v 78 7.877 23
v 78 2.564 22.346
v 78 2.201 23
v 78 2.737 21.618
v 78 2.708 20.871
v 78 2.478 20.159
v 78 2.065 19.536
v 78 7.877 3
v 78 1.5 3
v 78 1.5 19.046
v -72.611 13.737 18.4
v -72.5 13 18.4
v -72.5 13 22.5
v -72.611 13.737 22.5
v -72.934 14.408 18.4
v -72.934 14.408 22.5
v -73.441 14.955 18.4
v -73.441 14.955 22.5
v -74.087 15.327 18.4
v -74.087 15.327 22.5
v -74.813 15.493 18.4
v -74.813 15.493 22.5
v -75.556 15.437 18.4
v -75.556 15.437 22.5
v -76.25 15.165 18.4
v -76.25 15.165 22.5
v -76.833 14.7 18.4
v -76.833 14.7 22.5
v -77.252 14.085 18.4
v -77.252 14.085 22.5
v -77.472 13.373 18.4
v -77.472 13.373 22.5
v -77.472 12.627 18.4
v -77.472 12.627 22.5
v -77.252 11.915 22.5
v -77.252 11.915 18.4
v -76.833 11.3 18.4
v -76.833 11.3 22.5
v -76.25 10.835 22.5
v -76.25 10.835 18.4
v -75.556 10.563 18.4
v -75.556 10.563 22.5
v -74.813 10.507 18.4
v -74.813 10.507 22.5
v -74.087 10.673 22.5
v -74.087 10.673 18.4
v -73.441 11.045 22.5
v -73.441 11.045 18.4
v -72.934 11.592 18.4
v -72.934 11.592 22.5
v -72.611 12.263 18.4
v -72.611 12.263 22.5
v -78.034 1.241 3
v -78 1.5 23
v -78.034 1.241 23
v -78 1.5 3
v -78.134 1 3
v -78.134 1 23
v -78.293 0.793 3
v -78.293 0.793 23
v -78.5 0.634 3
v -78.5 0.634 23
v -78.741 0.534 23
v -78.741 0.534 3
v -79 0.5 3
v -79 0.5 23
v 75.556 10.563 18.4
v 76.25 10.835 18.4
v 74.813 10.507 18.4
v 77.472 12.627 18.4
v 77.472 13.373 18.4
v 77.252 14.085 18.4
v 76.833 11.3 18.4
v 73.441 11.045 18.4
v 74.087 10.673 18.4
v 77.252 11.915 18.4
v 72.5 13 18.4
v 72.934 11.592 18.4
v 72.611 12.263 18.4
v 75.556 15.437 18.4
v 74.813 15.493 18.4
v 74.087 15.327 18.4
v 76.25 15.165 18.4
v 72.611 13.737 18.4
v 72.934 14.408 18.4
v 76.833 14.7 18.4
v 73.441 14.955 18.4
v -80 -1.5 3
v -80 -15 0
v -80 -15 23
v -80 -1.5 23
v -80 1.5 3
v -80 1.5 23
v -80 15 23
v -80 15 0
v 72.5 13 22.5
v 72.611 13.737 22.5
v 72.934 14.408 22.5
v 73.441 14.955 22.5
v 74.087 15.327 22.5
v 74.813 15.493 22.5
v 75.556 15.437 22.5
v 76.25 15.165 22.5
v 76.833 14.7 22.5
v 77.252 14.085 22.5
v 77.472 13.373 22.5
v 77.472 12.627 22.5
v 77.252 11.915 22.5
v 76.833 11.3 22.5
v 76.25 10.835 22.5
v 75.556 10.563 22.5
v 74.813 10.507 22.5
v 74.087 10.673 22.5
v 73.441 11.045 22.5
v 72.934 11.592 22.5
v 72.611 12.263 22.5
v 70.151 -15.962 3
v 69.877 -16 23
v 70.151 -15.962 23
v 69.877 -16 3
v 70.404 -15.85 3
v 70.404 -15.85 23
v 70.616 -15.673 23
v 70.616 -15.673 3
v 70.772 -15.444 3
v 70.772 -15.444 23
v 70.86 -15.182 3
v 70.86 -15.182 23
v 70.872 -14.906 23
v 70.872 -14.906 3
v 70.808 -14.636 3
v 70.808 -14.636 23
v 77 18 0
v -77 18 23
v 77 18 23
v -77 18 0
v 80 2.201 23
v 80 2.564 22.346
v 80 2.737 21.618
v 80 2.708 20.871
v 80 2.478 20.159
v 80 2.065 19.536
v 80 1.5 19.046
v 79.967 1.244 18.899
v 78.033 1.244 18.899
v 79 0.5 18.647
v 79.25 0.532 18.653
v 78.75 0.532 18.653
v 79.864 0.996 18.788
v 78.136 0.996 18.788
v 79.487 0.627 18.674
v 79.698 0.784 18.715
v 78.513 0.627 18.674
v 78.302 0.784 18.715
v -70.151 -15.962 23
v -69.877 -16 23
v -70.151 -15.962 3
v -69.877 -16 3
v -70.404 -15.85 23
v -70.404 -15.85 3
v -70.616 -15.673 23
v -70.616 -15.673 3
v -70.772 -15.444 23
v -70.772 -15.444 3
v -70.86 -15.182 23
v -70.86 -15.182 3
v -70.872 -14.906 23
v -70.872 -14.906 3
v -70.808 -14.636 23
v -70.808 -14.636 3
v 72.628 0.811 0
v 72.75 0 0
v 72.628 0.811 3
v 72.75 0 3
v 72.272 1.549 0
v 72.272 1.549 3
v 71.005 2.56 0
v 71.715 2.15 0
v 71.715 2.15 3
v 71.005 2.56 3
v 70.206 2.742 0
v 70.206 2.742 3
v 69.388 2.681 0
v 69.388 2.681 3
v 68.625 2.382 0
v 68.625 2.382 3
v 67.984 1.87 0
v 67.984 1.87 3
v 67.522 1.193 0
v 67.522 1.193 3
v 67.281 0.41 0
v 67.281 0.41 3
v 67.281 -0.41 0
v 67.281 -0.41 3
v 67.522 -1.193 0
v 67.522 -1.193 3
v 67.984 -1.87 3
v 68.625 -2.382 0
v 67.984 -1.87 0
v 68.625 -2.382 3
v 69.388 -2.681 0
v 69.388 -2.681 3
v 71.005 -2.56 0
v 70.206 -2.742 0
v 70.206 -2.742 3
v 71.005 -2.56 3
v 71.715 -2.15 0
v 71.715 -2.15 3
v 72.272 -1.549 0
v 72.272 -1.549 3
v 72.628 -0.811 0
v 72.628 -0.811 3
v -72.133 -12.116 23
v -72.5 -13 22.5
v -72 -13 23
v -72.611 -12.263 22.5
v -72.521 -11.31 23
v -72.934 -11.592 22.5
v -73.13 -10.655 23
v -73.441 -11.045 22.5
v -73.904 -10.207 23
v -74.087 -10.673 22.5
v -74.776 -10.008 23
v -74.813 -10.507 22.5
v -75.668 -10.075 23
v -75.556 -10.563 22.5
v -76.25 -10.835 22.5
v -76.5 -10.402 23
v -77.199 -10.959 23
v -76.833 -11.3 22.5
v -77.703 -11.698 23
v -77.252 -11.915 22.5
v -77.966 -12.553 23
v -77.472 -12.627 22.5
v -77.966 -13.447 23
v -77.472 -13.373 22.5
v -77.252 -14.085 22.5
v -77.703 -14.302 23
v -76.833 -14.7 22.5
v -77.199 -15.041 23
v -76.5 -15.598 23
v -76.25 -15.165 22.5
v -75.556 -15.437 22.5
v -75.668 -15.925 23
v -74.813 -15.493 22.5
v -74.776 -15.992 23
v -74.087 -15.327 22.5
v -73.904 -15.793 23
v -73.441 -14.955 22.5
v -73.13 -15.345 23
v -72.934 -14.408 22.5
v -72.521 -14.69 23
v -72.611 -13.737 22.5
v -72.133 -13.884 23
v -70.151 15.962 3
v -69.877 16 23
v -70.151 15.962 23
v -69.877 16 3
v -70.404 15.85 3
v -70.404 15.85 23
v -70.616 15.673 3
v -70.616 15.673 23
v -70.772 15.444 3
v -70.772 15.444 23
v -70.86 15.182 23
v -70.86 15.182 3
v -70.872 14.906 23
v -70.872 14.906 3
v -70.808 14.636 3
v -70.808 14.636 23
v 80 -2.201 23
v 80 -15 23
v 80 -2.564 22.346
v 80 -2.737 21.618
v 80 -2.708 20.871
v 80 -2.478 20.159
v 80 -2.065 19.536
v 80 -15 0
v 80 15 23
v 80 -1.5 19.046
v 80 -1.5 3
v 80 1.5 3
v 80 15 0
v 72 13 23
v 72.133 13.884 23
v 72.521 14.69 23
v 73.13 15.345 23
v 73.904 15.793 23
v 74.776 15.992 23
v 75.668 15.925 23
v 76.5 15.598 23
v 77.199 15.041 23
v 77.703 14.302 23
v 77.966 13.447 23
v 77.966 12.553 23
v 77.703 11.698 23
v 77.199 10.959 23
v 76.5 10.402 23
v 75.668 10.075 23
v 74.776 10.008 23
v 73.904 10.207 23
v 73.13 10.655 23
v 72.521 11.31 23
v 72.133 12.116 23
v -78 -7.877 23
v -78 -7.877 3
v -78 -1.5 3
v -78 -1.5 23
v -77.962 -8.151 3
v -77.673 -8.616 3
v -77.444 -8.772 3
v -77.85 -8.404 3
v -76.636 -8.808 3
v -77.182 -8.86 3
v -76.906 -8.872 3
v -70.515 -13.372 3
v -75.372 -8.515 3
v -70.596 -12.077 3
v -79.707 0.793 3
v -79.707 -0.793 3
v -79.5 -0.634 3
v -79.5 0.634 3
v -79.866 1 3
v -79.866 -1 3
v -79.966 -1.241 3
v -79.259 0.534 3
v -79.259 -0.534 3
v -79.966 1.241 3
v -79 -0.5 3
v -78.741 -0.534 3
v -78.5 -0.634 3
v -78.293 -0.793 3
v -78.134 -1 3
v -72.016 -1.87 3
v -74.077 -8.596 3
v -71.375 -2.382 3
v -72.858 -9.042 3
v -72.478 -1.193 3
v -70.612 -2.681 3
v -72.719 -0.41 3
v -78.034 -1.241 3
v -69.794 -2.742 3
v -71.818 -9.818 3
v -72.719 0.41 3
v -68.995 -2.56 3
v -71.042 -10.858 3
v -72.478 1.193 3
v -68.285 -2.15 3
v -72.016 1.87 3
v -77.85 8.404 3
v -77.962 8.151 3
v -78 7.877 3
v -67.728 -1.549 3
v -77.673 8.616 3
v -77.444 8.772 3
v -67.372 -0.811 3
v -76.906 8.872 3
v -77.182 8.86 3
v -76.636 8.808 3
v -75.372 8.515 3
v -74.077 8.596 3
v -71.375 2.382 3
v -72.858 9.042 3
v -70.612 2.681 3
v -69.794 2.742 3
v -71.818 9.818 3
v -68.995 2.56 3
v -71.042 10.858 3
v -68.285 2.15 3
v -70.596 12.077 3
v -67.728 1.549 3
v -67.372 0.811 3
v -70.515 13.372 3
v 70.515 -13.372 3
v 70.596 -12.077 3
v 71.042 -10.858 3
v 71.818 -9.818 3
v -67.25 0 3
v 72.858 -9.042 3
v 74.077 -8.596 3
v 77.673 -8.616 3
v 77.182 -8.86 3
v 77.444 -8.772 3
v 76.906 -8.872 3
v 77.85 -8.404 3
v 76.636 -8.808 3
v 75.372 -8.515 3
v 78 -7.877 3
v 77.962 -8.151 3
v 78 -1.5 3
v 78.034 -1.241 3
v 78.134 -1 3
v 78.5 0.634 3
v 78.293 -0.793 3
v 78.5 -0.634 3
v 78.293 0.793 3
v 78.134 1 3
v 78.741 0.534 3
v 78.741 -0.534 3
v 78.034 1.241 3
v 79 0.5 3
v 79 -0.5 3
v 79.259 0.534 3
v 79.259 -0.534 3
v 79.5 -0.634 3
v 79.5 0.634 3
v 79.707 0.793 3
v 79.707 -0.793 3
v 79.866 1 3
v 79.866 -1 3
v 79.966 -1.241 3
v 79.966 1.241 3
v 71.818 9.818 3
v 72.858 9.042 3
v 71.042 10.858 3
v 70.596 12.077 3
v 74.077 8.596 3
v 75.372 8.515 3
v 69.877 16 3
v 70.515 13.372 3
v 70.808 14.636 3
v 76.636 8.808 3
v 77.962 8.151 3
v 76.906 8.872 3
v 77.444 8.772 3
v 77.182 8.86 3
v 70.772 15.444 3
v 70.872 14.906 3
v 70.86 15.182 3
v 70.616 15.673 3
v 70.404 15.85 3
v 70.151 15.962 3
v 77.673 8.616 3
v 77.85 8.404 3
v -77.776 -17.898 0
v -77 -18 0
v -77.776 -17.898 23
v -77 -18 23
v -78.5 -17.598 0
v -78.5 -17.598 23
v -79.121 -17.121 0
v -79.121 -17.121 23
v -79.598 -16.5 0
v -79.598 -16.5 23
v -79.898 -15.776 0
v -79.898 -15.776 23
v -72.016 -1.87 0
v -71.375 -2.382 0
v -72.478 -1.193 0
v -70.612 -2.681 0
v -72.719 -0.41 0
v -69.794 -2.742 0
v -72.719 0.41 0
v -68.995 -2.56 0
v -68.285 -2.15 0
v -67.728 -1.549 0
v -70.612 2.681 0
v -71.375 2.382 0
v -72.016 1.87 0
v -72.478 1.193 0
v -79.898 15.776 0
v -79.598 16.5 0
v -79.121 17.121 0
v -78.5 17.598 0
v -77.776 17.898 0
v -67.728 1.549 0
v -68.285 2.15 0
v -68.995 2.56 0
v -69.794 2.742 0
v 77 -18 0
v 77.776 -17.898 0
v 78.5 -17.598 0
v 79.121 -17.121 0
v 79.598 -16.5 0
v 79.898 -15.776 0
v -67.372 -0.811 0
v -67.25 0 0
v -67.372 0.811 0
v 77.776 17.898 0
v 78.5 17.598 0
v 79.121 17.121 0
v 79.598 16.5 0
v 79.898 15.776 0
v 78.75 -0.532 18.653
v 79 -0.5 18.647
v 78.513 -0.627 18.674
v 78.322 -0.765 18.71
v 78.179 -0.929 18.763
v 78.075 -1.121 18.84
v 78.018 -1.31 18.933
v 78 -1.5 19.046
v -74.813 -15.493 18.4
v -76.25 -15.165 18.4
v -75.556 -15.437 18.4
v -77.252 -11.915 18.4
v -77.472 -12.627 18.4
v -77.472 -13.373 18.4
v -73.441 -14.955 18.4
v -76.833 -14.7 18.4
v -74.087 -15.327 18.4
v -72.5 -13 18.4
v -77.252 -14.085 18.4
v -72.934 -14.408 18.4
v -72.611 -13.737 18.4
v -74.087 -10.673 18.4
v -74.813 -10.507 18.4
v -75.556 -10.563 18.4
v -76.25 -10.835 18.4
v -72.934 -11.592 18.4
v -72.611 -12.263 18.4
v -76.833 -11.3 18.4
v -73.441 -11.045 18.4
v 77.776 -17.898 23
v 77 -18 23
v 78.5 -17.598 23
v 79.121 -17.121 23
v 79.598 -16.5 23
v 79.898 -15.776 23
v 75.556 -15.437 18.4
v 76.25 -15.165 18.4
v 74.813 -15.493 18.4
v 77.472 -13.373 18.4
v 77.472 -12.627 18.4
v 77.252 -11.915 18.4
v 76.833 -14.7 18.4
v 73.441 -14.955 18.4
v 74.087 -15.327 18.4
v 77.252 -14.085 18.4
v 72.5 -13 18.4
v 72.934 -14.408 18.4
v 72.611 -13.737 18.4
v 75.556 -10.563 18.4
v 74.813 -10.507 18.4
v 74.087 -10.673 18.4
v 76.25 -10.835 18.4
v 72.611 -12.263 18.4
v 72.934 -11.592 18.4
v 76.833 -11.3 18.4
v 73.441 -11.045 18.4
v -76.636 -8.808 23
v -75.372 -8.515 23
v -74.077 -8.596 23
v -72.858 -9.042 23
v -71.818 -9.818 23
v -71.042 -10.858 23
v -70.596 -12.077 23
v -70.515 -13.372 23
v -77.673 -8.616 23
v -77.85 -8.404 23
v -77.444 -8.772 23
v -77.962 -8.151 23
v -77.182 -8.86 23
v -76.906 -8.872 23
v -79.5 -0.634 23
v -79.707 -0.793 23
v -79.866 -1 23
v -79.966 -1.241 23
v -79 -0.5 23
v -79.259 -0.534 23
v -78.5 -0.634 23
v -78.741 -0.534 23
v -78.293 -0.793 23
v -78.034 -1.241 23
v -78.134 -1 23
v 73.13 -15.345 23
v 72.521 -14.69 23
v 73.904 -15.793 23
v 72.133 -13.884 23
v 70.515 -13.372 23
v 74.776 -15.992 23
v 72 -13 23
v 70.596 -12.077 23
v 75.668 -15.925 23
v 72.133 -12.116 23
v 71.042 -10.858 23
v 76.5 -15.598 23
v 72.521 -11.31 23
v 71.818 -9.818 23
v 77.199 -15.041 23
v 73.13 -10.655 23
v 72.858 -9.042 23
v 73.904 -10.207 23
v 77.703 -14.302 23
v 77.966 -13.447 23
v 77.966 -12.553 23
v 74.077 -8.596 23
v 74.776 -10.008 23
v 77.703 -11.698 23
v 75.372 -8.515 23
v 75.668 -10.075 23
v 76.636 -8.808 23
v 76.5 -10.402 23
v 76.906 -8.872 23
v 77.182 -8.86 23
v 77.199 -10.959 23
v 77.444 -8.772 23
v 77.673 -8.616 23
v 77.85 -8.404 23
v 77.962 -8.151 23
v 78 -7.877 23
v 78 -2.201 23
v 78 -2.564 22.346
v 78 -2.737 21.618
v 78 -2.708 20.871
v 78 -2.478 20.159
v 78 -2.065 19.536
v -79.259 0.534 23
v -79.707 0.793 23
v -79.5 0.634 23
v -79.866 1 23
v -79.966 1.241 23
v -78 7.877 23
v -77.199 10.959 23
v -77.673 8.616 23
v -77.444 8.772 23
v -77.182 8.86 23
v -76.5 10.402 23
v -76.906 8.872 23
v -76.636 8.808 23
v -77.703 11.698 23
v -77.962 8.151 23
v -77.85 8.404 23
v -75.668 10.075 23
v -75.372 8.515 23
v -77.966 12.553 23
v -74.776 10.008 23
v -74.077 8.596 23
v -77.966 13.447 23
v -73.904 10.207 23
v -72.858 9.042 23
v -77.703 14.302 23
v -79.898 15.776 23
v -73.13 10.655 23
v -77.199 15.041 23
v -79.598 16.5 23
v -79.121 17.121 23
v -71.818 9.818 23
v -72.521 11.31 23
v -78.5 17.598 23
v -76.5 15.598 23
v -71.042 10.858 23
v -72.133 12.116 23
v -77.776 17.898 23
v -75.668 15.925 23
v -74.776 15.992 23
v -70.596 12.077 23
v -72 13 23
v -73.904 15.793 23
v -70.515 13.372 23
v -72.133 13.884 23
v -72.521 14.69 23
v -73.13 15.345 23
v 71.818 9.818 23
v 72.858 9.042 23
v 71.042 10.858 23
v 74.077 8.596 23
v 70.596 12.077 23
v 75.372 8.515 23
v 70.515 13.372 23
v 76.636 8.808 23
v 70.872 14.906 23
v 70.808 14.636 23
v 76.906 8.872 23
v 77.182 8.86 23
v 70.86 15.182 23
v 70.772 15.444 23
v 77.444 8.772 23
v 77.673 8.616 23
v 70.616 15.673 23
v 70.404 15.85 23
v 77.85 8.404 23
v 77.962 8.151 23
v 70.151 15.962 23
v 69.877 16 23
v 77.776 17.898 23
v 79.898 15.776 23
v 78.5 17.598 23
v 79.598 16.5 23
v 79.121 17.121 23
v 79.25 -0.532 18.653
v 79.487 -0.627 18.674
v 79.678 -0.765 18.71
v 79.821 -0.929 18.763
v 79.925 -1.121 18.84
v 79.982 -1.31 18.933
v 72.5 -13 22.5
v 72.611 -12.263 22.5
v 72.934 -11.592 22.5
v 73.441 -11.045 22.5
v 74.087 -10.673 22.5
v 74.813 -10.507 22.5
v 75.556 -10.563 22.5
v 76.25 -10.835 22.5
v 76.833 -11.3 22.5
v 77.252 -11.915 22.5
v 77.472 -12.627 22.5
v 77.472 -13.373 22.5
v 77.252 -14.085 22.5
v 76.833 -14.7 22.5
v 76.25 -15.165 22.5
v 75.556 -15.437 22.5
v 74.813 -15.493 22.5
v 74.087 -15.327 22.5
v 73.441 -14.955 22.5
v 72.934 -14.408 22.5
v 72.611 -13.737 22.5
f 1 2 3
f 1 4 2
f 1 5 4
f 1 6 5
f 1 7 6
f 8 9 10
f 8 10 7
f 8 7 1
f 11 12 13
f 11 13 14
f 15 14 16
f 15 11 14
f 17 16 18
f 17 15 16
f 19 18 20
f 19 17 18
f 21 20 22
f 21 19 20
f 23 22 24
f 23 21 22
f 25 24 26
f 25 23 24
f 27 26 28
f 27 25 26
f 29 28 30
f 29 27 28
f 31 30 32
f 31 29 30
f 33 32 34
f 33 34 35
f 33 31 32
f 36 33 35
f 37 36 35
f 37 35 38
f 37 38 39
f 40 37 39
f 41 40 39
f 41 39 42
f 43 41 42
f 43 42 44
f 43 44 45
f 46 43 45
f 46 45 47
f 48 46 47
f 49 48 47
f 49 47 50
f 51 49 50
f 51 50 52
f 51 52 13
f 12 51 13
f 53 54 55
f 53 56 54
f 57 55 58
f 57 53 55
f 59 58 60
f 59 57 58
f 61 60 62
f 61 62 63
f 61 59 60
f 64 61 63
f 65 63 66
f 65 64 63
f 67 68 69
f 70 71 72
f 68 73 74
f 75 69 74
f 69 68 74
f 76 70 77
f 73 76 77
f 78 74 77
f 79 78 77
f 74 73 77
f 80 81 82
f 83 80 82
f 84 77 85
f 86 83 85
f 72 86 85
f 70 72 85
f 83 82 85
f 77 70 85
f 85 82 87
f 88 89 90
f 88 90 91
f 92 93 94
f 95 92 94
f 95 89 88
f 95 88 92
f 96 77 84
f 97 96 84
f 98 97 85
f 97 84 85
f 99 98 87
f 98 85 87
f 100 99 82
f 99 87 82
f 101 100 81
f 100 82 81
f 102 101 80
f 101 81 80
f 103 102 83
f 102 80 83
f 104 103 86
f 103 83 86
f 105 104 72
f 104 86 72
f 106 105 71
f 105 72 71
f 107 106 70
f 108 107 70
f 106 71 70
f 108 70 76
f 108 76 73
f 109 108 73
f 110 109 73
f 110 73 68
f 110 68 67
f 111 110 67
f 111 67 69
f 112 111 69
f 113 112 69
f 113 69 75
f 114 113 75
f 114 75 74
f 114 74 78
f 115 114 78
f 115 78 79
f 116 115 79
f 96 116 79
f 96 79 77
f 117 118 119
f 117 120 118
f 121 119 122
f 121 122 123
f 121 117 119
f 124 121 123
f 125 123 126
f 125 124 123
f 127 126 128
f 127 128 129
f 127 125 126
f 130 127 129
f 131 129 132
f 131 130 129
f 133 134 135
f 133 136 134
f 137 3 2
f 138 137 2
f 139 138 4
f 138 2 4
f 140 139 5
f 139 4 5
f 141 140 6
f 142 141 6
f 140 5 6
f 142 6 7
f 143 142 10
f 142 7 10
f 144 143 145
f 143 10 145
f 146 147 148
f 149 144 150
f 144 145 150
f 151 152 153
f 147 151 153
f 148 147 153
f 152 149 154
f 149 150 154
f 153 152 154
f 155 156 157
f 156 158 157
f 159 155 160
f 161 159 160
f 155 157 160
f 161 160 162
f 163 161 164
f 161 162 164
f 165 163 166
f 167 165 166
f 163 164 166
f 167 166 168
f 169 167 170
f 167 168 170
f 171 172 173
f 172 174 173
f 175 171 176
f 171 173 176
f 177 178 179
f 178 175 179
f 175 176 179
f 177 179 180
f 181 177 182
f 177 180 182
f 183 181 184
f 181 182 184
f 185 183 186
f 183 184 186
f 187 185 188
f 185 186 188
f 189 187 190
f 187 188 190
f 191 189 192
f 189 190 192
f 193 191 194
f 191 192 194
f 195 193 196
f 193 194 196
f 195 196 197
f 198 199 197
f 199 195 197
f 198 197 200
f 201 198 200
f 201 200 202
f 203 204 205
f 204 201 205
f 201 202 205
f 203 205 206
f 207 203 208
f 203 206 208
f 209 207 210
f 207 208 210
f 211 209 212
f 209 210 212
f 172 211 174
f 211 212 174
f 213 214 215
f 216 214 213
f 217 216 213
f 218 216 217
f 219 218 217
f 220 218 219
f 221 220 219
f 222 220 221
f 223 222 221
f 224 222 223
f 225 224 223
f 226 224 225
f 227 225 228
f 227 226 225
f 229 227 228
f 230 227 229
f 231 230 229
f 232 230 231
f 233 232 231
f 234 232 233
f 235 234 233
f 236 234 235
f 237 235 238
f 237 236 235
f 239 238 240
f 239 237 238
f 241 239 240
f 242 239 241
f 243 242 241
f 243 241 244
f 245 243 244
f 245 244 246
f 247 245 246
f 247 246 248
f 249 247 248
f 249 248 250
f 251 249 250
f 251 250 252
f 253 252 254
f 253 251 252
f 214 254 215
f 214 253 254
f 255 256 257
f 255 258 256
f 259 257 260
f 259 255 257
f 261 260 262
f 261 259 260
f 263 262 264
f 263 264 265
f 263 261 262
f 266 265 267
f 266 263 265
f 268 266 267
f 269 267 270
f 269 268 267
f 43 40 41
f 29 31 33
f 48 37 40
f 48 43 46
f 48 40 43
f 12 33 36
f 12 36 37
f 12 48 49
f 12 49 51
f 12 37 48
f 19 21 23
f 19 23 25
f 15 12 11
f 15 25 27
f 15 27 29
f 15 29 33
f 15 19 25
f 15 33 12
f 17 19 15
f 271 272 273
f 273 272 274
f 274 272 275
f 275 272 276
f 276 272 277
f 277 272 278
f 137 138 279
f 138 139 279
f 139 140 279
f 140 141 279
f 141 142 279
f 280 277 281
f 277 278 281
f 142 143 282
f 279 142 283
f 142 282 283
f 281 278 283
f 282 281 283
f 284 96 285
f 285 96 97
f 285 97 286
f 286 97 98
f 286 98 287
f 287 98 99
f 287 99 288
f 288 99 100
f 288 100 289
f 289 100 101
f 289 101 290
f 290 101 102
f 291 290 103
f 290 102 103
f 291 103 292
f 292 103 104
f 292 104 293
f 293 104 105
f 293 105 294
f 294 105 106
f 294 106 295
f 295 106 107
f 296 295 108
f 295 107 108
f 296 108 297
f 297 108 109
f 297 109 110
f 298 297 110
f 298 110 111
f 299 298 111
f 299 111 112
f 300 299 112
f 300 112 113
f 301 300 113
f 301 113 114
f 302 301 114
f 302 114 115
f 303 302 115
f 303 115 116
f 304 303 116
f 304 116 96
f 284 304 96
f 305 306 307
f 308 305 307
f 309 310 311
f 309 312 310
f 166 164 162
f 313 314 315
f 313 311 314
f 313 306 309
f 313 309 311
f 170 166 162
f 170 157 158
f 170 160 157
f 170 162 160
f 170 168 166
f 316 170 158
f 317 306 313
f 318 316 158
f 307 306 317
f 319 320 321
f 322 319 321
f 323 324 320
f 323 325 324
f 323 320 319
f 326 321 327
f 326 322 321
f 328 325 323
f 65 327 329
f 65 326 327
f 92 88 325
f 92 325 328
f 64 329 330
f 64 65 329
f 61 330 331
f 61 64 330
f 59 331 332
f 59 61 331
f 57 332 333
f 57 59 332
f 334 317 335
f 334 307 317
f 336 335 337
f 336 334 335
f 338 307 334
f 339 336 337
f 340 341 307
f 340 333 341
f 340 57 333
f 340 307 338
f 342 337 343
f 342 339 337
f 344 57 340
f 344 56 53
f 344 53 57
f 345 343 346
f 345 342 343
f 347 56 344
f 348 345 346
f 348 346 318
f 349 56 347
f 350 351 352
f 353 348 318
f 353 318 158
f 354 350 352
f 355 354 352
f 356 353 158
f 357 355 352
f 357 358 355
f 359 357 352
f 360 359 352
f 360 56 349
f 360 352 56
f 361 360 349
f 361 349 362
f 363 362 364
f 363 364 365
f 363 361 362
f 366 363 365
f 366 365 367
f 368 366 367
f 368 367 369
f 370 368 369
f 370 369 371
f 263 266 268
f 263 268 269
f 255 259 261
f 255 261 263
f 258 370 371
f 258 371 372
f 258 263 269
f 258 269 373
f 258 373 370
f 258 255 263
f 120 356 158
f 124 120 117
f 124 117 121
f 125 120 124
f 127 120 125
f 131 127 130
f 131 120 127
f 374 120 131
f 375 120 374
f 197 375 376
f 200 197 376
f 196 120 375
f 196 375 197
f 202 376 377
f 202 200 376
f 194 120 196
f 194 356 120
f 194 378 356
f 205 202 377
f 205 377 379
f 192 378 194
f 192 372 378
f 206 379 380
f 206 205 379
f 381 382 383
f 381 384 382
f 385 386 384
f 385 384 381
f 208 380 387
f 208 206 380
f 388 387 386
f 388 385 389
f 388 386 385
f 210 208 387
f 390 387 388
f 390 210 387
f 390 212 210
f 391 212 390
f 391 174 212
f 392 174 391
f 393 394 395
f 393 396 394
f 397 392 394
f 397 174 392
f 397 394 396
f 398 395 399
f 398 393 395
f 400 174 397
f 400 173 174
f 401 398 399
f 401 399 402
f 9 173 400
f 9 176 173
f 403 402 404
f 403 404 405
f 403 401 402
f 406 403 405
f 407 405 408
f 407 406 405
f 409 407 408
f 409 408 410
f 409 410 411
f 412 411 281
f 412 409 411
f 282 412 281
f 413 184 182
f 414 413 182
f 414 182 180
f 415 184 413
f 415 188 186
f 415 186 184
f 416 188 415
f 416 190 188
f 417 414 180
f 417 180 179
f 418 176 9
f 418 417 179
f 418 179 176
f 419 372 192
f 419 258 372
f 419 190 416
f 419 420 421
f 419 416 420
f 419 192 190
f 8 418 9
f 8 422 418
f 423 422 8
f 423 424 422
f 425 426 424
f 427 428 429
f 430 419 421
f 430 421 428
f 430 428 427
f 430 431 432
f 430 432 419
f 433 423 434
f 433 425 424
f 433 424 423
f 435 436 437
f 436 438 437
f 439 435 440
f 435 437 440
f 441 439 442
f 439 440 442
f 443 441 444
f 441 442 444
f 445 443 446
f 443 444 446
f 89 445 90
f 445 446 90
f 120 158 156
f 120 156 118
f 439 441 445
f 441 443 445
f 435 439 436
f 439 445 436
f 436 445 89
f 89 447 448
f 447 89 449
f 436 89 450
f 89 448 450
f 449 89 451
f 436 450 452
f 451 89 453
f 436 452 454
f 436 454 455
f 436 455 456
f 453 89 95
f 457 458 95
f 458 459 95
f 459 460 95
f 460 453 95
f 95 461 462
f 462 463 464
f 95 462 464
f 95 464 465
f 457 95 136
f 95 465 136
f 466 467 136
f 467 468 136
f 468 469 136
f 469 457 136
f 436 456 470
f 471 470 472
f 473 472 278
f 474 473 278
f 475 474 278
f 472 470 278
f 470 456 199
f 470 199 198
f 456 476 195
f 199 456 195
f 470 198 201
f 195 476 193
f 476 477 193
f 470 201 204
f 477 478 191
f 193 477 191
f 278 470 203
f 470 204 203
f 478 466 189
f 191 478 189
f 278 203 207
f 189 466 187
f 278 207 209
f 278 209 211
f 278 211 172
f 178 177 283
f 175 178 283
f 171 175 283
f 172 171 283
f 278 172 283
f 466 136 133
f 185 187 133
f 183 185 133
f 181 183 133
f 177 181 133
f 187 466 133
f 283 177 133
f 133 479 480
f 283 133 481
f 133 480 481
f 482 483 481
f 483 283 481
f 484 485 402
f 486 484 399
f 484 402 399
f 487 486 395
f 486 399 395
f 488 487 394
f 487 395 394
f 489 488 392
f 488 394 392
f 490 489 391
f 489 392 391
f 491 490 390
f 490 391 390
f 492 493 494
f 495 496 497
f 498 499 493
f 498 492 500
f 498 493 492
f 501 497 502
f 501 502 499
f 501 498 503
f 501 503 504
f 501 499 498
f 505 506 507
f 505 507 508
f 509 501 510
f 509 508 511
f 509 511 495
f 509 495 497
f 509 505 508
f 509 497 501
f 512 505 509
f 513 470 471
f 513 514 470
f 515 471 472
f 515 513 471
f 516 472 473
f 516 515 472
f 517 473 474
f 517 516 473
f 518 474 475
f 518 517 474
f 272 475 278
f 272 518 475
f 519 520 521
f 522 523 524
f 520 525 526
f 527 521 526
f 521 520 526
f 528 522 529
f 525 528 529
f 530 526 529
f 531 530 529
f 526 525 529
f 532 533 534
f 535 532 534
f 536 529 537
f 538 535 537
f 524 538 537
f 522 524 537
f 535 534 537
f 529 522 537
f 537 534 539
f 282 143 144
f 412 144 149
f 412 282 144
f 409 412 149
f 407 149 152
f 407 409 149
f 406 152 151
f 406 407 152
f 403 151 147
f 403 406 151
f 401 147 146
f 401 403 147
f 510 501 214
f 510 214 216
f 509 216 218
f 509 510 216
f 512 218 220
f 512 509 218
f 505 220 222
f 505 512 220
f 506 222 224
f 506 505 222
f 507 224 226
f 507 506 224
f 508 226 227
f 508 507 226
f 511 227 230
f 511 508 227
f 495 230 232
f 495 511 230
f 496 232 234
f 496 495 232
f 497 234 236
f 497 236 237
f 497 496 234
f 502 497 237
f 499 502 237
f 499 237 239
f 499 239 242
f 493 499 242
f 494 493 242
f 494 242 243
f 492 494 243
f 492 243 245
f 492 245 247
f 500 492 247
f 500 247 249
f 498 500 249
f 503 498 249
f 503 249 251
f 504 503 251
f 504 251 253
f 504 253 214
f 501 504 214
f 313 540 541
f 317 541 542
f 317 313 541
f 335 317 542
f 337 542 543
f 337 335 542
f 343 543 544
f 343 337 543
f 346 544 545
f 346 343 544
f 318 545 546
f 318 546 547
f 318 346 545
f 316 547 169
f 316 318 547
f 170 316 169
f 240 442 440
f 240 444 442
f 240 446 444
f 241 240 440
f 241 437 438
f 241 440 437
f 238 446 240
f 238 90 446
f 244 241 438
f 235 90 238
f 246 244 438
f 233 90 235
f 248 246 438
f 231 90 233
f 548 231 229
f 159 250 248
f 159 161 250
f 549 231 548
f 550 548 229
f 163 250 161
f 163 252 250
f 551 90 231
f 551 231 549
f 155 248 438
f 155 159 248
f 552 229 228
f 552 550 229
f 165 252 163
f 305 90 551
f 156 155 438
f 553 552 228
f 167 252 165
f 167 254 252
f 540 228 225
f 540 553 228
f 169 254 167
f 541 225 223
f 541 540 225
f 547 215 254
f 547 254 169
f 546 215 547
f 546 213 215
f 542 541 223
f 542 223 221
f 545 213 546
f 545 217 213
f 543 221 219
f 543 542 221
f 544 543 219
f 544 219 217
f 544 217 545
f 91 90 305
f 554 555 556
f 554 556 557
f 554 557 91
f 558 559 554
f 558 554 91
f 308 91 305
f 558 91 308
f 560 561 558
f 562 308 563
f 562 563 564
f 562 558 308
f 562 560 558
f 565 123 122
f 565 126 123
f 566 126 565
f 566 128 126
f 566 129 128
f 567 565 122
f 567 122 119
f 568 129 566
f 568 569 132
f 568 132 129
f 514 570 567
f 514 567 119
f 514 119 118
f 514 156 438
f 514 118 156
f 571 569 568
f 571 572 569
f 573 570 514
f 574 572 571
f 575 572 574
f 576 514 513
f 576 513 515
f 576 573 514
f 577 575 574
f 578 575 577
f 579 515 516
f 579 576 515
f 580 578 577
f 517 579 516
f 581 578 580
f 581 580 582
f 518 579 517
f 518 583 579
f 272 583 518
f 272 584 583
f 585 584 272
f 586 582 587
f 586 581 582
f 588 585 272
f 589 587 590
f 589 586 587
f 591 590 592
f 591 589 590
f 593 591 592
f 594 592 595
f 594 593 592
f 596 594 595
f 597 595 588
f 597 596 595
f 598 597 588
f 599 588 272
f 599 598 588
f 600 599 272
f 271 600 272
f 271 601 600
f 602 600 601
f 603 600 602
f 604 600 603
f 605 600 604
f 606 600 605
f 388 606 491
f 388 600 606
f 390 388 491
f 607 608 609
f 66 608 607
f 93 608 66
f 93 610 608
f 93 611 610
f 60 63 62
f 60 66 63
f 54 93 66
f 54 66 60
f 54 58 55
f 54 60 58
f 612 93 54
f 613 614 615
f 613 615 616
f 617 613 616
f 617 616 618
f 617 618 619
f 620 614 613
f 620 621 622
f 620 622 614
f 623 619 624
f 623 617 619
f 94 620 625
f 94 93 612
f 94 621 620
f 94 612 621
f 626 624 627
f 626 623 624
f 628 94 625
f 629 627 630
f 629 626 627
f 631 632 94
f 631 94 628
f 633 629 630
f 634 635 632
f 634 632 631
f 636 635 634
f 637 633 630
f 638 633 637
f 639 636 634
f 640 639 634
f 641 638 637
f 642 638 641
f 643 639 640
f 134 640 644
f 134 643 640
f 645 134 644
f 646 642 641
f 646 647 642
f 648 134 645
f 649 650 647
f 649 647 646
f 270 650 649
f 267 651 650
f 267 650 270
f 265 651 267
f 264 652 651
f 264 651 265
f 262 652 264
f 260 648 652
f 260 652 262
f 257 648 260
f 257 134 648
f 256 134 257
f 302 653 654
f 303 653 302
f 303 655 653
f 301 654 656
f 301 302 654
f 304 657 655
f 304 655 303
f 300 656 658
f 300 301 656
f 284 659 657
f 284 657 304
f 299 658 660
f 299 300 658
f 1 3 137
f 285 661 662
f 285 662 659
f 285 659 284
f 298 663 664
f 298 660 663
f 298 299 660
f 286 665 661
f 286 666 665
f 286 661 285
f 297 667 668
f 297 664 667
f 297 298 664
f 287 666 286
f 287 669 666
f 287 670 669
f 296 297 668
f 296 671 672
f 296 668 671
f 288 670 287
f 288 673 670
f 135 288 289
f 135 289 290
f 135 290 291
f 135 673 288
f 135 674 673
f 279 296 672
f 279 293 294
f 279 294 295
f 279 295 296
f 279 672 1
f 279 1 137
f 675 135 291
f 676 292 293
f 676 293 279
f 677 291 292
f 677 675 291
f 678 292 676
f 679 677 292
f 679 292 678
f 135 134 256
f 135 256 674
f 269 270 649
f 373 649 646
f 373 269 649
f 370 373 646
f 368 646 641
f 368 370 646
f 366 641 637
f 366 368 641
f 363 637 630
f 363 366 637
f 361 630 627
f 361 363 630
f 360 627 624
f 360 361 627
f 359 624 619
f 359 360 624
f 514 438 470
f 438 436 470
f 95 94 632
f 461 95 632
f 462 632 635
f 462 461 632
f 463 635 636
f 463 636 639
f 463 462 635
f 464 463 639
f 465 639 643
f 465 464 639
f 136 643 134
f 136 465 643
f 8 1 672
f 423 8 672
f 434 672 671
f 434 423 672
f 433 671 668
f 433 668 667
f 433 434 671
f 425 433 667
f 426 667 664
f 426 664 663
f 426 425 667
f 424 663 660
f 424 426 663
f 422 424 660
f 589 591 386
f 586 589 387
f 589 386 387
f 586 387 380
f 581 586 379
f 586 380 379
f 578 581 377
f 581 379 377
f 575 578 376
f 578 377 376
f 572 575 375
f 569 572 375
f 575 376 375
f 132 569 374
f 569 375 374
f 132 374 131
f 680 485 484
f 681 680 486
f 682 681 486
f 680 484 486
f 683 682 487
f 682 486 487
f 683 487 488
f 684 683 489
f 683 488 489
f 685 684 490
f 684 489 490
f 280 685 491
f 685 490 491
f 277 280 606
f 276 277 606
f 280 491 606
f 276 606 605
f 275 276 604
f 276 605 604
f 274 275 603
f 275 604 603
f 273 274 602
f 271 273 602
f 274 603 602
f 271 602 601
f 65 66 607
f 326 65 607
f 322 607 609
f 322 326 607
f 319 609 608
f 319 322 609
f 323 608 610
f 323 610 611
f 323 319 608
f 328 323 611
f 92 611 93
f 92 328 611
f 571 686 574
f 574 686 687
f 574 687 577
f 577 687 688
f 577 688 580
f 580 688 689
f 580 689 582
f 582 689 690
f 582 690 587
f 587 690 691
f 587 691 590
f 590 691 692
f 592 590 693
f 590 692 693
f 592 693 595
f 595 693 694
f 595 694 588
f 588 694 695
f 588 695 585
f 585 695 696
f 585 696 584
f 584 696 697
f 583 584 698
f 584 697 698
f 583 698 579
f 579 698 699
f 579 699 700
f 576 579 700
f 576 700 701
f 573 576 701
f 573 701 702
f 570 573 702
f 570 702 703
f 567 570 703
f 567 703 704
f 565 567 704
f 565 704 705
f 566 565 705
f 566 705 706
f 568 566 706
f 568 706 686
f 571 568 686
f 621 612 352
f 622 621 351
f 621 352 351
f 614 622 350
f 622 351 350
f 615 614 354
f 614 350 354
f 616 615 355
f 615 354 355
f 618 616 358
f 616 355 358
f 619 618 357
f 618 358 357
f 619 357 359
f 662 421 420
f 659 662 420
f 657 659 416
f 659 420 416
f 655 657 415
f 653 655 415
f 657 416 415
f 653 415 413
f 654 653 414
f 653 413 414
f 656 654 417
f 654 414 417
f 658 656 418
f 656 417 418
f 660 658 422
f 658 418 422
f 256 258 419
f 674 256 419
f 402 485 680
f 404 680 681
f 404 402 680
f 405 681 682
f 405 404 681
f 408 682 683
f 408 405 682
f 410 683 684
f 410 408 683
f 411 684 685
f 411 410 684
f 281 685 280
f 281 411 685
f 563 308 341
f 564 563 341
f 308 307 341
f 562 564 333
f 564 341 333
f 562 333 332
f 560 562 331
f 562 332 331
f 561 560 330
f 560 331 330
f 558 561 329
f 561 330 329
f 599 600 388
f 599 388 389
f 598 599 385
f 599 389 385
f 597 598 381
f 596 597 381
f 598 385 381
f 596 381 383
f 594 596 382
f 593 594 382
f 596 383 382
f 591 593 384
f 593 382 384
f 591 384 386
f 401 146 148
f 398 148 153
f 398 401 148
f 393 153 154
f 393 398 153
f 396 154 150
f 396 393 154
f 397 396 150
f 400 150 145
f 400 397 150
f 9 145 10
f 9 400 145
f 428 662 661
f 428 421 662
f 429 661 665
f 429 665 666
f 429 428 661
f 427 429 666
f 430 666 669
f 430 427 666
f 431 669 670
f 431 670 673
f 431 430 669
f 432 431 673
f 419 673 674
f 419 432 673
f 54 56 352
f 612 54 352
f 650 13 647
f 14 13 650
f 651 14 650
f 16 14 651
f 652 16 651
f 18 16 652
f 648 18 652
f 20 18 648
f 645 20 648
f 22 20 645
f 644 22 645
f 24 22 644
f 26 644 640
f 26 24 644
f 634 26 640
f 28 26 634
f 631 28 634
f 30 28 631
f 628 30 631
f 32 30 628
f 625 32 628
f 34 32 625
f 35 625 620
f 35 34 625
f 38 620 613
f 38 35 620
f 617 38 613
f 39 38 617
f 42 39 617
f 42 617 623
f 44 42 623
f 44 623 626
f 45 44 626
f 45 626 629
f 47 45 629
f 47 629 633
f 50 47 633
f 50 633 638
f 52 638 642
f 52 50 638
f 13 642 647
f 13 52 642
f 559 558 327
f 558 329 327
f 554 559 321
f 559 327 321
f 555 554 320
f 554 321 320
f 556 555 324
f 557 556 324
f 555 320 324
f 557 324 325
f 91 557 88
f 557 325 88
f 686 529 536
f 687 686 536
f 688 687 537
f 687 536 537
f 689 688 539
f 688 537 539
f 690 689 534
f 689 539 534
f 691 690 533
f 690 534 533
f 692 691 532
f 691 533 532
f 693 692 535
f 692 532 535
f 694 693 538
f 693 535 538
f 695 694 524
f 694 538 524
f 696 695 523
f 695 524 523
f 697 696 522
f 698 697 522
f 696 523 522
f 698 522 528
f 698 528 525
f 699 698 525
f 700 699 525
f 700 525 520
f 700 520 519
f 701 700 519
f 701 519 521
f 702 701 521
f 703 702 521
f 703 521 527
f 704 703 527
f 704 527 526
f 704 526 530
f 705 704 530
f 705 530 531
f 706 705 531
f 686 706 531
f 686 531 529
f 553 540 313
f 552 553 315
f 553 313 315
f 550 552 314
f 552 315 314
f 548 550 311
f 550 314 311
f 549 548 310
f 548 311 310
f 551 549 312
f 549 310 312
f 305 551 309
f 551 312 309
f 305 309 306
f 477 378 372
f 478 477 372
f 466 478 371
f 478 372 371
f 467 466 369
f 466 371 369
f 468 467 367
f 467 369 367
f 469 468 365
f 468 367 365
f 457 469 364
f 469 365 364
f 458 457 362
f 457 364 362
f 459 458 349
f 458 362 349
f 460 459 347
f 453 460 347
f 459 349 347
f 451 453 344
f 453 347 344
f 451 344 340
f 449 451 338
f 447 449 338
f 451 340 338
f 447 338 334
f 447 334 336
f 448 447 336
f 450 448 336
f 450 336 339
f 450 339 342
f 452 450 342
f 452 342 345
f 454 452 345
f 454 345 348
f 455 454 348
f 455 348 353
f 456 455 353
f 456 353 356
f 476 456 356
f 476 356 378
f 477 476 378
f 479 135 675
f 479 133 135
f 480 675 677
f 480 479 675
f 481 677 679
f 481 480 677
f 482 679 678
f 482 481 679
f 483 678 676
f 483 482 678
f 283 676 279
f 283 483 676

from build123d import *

# Parameters (mm, degrees)
SKETCH1_W                       = 160
SKETCH1_H                       = 36
BOSS_EXTRUDE1_DEPTH             = 3
SKETCH3_W                       = 160
SKETCH3_H                       = 36
SKETCH3_W_2                     = 156
SKETCH3_H_2                     = 32
BOSS_EXTRUDE3_DEPTH             = 20
SKETCH4_W                       = 2
SKETCH4_H                       = 1
CUT_EXTRUDE1_DEPTH              = 20
SKETCH5_R                       = 4.5
BOSS_EXTRUDE4_DEPTH             = 20
F_5_0MM_DOWEL_HOLE1_D           = 5
F_5_0MM_DOWEL_HOLE1_DEPTH       = 4.6
F_5_0MM_DOWEL_HOLE1_CSINK_D     = 6
F_5_0MM_DOWEL_HOLE1_CSINK_ANGLE = 90
FILLET3_R                       = 3
M5_CLEARANCE_HOLE2_D            = 5.5
FILLET4_R                       = 1
M5_CLEARANCE_HOLE3_D            = 5.5
M5_CLEARANCE_HOLE3_DEPTH        = 10
M5_CLEARANCE_HOLE3_TIP          = 1.652366702


with BuildPart() as part:
    # Sketch1 → Boss-Extrude1 (new body)
    with BuildSketch(Plane.XY):
        Rectangle(SKETCH1_W, SKETCH1_H)
    extrude(amount=BOSS_EXTRUDE1_DEPTH)

    # Sketch3 → Boss-Extrude3 (add)
    with BuildSketch(Plane.XY.offset(3)):
        Rectangle(SKETCH3_W, SKETCH3_H)
        Rectangle(SKETCH3_W_2, SKETCH3_H_2, mode=Mode.SUBTRACT)
    extrude(amount=BOSS_EXTRUDE3_DEPTH)

    # Sketch4 → Cut-Extrude1 (cut)
    with BuildSketch(Plane.XY.offset(23)):
        with Locations((79, 0)):
            Rectangle(SKETCH4_W, SKETCH4_H)
    cut_extrude1 = extrude(amount=-CUT_EXTRUDE1_DEPTH, mode=Mode.SUBTRACT)

    # Sketch5 → Boss-Extrude4 (add)
    with BuildSketch(Plane.XY.offset(3)):
        with Locations((75, 13)):
            Circle(SKETCH5_R)
        with Locations((75, -13)):
            Circle(SKETCH5_R)
    boss_extrude4 = extrude(amount=BOSS_EXTRUDE4_DEPTH)

    # Ø5.0mm Dowel Hole1
    with Locations(Plane.XY.offset(23)):
        with Locations((75, 13), (75, -13)):
            f_5_0mm_dowel_hole1 = CounterSinkHole(F_5_0MM_DOWEL_HOLE1_D / 2, F_5_0MM_DOWEL_HOLE1_CSINK_D / 2, depth=F_5_0MM_DOWEL_HOLE1_DEPTH, counter_sink_angle=F_5_0MM_DOWEL_HOLE1_CSINK_ANGLE)

    # Fillet3
    fillet3_edges = [part.edges().sort_by_distance(p)[0] for p in [
        (-80, 18, 11.5),
        (80, 18, 11.5),
        (80, -18, 11.5),
        (-80, -18, 11.5),
    ]]
    fillet(fillet3_edges, radius=FILLET3_R)

    # M5 Clearance Hole2 (through all)
    with Locations(Plane(origin=(0, 0, 0), x_dir=(-1, 0, 0), z_dir=(0, 0, -1))):
        with Locations((-70, 0), (70, 0)):
            m5_clearance_hole2 = Hole(M5_CLEARANCE_HOLE2_D / 2)

    # Mirror2: Cut-Extrude1, Boss-Extrude4, Ø5.0mm Dowel Hole1, M5 Clearance Hole2 across plane
    add(cut_extrude1.mirror(Plane(origin=(0, 0, 0), x_dir=(0, 0, 1), z_dir=(1, 0, 0))), mode=Mode.SUBTRACT)
    add(boss_extrude4.mirror(Plane(origin=(0, 0, 0), x_dir=(0, 0, 1), z_dir=(1, 0, 0))))
    add(f_5_0mm_dowel_hole1.mirror(Plane(origin=(0, 0, 0), x_dir=(0, 0, 1), z_dir=(1, 0, 0))), mode=Mode.SUBTRACT)
    add(m5_clearance_hole2.mirror(Plane(origin=(0, 0, 0), x_dir=(0, 0, 1), z_dir=(1, 0, 0))), mode=Mode.SUBTRACT)

    # Fillet4
    fillet4_edges = [part.edges().sort_by_distance(p)[0] for p in [
        (-78, -9.645898034, 13),
        (-78, -0.5, 13),
        (-80, -0.5, 13),
        (-80, 0.5, 13),
        (-78, 0.5, 13),
        (-78, 9.645898034, 13),
        (-71.645898034, 16, 13),
        (71.645898034, 16, 13),
        (78, 0.5, 13),
        (80, 0.5, 13),
        (80, -0.5, 13),
        (78, -0.5, 13),
        (78, -9.645898034, 13),
        (71.645898034, -16, 13),
        (-71.645898034, -16, 13),
        (78, 9.645898034, 13),
    ]]
    fillet(fillet4_edges, radius=FILLET4_R - 0.0001)  # a hair under: the kernel refuses the full size

    # M5 Clearance Hole3
    with Locations(Plane(origin=(80, 0, 0), x_dir=(0, 0, -1), z_dir=(1, 0, 0))):
        with Locations((-21.351359234, 0)):
            Hole(M5_CLEARANCE_HOLE3_D / 2, depth=M5_CLEARANCE_HOLE3_DEPTH)
            with Locations((0, 0, -(M5_CLEARANCE_HOLE3_DEPTH + M5_CLEARANCE_HOLE3_TIP / 2))):  # 118° drill point
                Cone(0, M5_CLEARANCE_HOLE3_D / 2, M5_CLEARANCE_HOLE3_TIP, mode=Mode.SUBTRACT)


solid = part.part
